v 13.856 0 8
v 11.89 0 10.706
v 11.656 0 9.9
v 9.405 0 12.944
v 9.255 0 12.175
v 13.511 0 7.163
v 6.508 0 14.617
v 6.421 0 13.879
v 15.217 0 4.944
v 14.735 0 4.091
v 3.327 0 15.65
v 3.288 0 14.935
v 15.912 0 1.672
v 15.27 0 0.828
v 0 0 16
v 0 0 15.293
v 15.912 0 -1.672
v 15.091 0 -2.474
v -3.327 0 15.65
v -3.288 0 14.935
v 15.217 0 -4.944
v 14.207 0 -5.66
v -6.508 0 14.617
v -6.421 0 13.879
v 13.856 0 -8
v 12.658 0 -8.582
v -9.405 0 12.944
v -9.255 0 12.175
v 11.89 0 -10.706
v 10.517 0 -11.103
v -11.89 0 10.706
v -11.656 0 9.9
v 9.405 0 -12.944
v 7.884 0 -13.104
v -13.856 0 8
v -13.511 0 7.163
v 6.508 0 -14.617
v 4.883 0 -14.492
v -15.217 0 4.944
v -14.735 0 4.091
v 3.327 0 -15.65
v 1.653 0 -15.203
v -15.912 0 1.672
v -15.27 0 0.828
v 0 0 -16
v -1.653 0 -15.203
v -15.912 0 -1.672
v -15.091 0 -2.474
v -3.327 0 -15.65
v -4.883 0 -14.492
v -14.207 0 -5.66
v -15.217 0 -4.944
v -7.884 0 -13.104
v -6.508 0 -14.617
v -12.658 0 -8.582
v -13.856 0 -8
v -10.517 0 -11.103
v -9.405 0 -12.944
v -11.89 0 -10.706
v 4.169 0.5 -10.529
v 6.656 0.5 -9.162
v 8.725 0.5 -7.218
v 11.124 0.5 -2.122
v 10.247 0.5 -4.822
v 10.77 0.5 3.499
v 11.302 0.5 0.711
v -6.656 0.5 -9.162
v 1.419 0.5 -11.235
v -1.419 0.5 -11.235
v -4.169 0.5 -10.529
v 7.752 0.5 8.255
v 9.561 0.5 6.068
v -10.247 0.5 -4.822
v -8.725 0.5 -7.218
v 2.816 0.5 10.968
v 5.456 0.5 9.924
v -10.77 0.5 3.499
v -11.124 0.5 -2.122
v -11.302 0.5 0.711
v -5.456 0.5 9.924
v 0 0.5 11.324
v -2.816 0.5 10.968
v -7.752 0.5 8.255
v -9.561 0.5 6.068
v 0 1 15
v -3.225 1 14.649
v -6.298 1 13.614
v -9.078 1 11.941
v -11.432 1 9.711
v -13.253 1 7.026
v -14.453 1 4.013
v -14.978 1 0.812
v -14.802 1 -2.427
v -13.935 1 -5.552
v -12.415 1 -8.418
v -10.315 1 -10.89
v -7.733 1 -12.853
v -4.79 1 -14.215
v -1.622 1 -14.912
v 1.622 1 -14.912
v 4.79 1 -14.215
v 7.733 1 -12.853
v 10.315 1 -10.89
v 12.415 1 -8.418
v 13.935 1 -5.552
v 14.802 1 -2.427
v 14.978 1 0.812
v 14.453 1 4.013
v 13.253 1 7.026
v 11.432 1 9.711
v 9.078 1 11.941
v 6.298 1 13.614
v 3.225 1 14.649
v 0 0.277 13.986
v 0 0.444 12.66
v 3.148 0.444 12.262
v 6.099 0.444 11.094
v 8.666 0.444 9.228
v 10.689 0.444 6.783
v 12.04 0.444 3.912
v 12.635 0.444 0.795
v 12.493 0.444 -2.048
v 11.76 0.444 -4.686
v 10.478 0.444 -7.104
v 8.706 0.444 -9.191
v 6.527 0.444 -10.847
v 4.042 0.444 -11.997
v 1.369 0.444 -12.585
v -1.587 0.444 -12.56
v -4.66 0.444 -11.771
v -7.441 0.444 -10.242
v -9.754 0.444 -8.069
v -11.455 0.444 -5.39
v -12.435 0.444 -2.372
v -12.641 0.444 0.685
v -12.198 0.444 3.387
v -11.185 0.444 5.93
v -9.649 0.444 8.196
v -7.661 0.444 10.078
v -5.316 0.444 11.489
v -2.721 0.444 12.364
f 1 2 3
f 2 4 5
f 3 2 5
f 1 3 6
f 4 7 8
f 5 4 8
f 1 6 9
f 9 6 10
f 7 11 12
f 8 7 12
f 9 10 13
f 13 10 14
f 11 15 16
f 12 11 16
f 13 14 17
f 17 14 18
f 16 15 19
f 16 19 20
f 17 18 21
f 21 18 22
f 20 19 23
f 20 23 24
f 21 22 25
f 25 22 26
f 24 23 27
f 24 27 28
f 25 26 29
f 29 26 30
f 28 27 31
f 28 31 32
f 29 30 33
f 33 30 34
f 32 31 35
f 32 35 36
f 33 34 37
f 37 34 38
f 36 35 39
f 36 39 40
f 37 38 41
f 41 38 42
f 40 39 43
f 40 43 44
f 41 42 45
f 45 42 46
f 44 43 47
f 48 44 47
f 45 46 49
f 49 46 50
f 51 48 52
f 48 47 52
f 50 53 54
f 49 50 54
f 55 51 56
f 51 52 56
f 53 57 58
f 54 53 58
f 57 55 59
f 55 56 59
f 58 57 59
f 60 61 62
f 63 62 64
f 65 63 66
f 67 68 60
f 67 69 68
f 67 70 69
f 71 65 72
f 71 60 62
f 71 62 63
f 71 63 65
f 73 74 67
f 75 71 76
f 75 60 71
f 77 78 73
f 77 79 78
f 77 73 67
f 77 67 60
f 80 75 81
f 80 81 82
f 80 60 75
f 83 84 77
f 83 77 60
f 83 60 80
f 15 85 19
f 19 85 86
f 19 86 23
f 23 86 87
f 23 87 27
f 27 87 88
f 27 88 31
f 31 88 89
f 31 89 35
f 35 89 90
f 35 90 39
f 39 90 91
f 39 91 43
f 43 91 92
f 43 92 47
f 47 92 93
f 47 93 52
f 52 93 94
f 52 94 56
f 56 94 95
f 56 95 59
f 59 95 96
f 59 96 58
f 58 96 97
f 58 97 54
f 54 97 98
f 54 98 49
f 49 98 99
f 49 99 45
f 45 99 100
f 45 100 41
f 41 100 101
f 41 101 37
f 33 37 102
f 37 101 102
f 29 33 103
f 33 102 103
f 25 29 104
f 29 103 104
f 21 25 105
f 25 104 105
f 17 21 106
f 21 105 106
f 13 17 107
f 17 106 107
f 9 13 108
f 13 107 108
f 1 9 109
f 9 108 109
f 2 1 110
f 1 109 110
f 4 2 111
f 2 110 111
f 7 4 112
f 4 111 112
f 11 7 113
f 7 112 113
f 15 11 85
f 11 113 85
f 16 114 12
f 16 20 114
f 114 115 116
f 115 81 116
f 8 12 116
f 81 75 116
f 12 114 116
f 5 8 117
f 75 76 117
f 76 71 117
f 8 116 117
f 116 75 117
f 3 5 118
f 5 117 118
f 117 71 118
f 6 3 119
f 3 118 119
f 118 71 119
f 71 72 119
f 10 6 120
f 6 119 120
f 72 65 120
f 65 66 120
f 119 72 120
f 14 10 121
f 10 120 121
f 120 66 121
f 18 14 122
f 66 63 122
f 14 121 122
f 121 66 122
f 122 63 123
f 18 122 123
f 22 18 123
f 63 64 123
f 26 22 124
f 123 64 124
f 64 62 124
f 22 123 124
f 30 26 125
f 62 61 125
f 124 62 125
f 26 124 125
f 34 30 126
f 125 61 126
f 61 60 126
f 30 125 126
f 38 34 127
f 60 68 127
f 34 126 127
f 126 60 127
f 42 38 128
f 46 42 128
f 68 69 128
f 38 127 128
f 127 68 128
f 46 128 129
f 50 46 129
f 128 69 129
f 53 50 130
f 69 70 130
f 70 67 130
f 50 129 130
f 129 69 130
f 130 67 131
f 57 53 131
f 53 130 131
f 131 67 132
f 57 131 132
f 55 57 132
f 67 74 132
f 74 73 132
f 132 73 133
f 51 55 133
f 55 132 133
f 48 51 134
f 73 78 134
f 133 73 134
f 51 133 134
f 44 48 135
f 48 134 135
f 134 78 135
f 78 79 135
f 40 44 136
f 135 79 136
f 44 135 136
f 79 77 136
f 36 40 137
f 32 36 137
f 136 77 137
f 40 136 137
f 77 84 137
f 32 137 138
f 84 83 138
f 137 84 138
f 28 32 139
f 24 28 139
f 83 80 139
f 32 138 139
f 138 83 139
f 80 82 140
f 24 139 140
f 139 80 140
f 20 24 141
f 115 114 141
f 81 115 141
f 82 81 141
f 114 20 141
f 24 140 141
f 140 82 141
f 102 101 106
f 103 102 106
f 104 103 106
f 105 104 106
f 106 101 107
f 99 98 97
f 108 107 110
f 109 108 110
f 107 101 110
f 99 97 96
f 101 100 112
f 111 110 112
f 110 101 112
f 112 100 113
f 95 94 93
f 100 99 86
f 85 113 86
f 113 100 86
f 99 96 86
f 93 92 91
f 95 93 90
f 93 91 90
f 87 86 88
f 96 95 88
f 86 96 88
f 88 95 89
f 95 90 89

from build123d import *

# Parameters (mm, degrees)
FOOT_SHELL_T  = -0.5
FOOT_FILLET_R = 16


with BuildPart() as part:
    # Sketch1 → Foot Revolve (revolve)
    with BuildSketch(Plane.XY, mode=Mode.PRIVATE) as foot_revolve_sk:
        Polygon((0, 0), (16, 0), (15, 1), (0, 1), align=None)
    revolve(foot_revolve_sk.sketch.rotate(Axis((0, 1, 0), (0, -1, 0)), 90), axis=Axis((0, 1, 0), (0, -1, 0)))

    # Foot Shell
    foot_shell_openings = [part.faces().sort_by_distance(p)[0] for p in [
        (0, 0, 0),
    ]]
    offset(amount=FOOT_SHELL_T, openings=foot_shell_openings, kind=Kind.INTERSECTION)

    # Foot Fillet
    # the kernel refuses this fillet: 16 mm, written as the material it adds along each edge
    with BuildSketch(Plane(origin=(0, 0.5, 0), x_dir=(0, 0, 1), z_dir=(-1, 0, 0))) as foot_fillet_piece_1:
        with BuildLine():
            CenterArc((11.324266252, -16), FOOT_FILLET_R, 75.638488437, 14.361511563)
            Line((11.324266252, 0), (11.324266252, 0.32))
            Line((11.324266252, 0.32), (14.792893219, 0.32))
            Line((14.792893219, 0.32), (15.019167389, 0.22627417))
            ThreePointArc((15.019167389, 0.22627417), (15.269167389, -0.02372583), (15.372265758, -0.19))
            Line((15.372265758, -0.19), (15.292893219, -0.5))
        make_face()
    revolve(axis=Axis((0, 0.5, 0), (0, 1, 0)))


solid = part.part
